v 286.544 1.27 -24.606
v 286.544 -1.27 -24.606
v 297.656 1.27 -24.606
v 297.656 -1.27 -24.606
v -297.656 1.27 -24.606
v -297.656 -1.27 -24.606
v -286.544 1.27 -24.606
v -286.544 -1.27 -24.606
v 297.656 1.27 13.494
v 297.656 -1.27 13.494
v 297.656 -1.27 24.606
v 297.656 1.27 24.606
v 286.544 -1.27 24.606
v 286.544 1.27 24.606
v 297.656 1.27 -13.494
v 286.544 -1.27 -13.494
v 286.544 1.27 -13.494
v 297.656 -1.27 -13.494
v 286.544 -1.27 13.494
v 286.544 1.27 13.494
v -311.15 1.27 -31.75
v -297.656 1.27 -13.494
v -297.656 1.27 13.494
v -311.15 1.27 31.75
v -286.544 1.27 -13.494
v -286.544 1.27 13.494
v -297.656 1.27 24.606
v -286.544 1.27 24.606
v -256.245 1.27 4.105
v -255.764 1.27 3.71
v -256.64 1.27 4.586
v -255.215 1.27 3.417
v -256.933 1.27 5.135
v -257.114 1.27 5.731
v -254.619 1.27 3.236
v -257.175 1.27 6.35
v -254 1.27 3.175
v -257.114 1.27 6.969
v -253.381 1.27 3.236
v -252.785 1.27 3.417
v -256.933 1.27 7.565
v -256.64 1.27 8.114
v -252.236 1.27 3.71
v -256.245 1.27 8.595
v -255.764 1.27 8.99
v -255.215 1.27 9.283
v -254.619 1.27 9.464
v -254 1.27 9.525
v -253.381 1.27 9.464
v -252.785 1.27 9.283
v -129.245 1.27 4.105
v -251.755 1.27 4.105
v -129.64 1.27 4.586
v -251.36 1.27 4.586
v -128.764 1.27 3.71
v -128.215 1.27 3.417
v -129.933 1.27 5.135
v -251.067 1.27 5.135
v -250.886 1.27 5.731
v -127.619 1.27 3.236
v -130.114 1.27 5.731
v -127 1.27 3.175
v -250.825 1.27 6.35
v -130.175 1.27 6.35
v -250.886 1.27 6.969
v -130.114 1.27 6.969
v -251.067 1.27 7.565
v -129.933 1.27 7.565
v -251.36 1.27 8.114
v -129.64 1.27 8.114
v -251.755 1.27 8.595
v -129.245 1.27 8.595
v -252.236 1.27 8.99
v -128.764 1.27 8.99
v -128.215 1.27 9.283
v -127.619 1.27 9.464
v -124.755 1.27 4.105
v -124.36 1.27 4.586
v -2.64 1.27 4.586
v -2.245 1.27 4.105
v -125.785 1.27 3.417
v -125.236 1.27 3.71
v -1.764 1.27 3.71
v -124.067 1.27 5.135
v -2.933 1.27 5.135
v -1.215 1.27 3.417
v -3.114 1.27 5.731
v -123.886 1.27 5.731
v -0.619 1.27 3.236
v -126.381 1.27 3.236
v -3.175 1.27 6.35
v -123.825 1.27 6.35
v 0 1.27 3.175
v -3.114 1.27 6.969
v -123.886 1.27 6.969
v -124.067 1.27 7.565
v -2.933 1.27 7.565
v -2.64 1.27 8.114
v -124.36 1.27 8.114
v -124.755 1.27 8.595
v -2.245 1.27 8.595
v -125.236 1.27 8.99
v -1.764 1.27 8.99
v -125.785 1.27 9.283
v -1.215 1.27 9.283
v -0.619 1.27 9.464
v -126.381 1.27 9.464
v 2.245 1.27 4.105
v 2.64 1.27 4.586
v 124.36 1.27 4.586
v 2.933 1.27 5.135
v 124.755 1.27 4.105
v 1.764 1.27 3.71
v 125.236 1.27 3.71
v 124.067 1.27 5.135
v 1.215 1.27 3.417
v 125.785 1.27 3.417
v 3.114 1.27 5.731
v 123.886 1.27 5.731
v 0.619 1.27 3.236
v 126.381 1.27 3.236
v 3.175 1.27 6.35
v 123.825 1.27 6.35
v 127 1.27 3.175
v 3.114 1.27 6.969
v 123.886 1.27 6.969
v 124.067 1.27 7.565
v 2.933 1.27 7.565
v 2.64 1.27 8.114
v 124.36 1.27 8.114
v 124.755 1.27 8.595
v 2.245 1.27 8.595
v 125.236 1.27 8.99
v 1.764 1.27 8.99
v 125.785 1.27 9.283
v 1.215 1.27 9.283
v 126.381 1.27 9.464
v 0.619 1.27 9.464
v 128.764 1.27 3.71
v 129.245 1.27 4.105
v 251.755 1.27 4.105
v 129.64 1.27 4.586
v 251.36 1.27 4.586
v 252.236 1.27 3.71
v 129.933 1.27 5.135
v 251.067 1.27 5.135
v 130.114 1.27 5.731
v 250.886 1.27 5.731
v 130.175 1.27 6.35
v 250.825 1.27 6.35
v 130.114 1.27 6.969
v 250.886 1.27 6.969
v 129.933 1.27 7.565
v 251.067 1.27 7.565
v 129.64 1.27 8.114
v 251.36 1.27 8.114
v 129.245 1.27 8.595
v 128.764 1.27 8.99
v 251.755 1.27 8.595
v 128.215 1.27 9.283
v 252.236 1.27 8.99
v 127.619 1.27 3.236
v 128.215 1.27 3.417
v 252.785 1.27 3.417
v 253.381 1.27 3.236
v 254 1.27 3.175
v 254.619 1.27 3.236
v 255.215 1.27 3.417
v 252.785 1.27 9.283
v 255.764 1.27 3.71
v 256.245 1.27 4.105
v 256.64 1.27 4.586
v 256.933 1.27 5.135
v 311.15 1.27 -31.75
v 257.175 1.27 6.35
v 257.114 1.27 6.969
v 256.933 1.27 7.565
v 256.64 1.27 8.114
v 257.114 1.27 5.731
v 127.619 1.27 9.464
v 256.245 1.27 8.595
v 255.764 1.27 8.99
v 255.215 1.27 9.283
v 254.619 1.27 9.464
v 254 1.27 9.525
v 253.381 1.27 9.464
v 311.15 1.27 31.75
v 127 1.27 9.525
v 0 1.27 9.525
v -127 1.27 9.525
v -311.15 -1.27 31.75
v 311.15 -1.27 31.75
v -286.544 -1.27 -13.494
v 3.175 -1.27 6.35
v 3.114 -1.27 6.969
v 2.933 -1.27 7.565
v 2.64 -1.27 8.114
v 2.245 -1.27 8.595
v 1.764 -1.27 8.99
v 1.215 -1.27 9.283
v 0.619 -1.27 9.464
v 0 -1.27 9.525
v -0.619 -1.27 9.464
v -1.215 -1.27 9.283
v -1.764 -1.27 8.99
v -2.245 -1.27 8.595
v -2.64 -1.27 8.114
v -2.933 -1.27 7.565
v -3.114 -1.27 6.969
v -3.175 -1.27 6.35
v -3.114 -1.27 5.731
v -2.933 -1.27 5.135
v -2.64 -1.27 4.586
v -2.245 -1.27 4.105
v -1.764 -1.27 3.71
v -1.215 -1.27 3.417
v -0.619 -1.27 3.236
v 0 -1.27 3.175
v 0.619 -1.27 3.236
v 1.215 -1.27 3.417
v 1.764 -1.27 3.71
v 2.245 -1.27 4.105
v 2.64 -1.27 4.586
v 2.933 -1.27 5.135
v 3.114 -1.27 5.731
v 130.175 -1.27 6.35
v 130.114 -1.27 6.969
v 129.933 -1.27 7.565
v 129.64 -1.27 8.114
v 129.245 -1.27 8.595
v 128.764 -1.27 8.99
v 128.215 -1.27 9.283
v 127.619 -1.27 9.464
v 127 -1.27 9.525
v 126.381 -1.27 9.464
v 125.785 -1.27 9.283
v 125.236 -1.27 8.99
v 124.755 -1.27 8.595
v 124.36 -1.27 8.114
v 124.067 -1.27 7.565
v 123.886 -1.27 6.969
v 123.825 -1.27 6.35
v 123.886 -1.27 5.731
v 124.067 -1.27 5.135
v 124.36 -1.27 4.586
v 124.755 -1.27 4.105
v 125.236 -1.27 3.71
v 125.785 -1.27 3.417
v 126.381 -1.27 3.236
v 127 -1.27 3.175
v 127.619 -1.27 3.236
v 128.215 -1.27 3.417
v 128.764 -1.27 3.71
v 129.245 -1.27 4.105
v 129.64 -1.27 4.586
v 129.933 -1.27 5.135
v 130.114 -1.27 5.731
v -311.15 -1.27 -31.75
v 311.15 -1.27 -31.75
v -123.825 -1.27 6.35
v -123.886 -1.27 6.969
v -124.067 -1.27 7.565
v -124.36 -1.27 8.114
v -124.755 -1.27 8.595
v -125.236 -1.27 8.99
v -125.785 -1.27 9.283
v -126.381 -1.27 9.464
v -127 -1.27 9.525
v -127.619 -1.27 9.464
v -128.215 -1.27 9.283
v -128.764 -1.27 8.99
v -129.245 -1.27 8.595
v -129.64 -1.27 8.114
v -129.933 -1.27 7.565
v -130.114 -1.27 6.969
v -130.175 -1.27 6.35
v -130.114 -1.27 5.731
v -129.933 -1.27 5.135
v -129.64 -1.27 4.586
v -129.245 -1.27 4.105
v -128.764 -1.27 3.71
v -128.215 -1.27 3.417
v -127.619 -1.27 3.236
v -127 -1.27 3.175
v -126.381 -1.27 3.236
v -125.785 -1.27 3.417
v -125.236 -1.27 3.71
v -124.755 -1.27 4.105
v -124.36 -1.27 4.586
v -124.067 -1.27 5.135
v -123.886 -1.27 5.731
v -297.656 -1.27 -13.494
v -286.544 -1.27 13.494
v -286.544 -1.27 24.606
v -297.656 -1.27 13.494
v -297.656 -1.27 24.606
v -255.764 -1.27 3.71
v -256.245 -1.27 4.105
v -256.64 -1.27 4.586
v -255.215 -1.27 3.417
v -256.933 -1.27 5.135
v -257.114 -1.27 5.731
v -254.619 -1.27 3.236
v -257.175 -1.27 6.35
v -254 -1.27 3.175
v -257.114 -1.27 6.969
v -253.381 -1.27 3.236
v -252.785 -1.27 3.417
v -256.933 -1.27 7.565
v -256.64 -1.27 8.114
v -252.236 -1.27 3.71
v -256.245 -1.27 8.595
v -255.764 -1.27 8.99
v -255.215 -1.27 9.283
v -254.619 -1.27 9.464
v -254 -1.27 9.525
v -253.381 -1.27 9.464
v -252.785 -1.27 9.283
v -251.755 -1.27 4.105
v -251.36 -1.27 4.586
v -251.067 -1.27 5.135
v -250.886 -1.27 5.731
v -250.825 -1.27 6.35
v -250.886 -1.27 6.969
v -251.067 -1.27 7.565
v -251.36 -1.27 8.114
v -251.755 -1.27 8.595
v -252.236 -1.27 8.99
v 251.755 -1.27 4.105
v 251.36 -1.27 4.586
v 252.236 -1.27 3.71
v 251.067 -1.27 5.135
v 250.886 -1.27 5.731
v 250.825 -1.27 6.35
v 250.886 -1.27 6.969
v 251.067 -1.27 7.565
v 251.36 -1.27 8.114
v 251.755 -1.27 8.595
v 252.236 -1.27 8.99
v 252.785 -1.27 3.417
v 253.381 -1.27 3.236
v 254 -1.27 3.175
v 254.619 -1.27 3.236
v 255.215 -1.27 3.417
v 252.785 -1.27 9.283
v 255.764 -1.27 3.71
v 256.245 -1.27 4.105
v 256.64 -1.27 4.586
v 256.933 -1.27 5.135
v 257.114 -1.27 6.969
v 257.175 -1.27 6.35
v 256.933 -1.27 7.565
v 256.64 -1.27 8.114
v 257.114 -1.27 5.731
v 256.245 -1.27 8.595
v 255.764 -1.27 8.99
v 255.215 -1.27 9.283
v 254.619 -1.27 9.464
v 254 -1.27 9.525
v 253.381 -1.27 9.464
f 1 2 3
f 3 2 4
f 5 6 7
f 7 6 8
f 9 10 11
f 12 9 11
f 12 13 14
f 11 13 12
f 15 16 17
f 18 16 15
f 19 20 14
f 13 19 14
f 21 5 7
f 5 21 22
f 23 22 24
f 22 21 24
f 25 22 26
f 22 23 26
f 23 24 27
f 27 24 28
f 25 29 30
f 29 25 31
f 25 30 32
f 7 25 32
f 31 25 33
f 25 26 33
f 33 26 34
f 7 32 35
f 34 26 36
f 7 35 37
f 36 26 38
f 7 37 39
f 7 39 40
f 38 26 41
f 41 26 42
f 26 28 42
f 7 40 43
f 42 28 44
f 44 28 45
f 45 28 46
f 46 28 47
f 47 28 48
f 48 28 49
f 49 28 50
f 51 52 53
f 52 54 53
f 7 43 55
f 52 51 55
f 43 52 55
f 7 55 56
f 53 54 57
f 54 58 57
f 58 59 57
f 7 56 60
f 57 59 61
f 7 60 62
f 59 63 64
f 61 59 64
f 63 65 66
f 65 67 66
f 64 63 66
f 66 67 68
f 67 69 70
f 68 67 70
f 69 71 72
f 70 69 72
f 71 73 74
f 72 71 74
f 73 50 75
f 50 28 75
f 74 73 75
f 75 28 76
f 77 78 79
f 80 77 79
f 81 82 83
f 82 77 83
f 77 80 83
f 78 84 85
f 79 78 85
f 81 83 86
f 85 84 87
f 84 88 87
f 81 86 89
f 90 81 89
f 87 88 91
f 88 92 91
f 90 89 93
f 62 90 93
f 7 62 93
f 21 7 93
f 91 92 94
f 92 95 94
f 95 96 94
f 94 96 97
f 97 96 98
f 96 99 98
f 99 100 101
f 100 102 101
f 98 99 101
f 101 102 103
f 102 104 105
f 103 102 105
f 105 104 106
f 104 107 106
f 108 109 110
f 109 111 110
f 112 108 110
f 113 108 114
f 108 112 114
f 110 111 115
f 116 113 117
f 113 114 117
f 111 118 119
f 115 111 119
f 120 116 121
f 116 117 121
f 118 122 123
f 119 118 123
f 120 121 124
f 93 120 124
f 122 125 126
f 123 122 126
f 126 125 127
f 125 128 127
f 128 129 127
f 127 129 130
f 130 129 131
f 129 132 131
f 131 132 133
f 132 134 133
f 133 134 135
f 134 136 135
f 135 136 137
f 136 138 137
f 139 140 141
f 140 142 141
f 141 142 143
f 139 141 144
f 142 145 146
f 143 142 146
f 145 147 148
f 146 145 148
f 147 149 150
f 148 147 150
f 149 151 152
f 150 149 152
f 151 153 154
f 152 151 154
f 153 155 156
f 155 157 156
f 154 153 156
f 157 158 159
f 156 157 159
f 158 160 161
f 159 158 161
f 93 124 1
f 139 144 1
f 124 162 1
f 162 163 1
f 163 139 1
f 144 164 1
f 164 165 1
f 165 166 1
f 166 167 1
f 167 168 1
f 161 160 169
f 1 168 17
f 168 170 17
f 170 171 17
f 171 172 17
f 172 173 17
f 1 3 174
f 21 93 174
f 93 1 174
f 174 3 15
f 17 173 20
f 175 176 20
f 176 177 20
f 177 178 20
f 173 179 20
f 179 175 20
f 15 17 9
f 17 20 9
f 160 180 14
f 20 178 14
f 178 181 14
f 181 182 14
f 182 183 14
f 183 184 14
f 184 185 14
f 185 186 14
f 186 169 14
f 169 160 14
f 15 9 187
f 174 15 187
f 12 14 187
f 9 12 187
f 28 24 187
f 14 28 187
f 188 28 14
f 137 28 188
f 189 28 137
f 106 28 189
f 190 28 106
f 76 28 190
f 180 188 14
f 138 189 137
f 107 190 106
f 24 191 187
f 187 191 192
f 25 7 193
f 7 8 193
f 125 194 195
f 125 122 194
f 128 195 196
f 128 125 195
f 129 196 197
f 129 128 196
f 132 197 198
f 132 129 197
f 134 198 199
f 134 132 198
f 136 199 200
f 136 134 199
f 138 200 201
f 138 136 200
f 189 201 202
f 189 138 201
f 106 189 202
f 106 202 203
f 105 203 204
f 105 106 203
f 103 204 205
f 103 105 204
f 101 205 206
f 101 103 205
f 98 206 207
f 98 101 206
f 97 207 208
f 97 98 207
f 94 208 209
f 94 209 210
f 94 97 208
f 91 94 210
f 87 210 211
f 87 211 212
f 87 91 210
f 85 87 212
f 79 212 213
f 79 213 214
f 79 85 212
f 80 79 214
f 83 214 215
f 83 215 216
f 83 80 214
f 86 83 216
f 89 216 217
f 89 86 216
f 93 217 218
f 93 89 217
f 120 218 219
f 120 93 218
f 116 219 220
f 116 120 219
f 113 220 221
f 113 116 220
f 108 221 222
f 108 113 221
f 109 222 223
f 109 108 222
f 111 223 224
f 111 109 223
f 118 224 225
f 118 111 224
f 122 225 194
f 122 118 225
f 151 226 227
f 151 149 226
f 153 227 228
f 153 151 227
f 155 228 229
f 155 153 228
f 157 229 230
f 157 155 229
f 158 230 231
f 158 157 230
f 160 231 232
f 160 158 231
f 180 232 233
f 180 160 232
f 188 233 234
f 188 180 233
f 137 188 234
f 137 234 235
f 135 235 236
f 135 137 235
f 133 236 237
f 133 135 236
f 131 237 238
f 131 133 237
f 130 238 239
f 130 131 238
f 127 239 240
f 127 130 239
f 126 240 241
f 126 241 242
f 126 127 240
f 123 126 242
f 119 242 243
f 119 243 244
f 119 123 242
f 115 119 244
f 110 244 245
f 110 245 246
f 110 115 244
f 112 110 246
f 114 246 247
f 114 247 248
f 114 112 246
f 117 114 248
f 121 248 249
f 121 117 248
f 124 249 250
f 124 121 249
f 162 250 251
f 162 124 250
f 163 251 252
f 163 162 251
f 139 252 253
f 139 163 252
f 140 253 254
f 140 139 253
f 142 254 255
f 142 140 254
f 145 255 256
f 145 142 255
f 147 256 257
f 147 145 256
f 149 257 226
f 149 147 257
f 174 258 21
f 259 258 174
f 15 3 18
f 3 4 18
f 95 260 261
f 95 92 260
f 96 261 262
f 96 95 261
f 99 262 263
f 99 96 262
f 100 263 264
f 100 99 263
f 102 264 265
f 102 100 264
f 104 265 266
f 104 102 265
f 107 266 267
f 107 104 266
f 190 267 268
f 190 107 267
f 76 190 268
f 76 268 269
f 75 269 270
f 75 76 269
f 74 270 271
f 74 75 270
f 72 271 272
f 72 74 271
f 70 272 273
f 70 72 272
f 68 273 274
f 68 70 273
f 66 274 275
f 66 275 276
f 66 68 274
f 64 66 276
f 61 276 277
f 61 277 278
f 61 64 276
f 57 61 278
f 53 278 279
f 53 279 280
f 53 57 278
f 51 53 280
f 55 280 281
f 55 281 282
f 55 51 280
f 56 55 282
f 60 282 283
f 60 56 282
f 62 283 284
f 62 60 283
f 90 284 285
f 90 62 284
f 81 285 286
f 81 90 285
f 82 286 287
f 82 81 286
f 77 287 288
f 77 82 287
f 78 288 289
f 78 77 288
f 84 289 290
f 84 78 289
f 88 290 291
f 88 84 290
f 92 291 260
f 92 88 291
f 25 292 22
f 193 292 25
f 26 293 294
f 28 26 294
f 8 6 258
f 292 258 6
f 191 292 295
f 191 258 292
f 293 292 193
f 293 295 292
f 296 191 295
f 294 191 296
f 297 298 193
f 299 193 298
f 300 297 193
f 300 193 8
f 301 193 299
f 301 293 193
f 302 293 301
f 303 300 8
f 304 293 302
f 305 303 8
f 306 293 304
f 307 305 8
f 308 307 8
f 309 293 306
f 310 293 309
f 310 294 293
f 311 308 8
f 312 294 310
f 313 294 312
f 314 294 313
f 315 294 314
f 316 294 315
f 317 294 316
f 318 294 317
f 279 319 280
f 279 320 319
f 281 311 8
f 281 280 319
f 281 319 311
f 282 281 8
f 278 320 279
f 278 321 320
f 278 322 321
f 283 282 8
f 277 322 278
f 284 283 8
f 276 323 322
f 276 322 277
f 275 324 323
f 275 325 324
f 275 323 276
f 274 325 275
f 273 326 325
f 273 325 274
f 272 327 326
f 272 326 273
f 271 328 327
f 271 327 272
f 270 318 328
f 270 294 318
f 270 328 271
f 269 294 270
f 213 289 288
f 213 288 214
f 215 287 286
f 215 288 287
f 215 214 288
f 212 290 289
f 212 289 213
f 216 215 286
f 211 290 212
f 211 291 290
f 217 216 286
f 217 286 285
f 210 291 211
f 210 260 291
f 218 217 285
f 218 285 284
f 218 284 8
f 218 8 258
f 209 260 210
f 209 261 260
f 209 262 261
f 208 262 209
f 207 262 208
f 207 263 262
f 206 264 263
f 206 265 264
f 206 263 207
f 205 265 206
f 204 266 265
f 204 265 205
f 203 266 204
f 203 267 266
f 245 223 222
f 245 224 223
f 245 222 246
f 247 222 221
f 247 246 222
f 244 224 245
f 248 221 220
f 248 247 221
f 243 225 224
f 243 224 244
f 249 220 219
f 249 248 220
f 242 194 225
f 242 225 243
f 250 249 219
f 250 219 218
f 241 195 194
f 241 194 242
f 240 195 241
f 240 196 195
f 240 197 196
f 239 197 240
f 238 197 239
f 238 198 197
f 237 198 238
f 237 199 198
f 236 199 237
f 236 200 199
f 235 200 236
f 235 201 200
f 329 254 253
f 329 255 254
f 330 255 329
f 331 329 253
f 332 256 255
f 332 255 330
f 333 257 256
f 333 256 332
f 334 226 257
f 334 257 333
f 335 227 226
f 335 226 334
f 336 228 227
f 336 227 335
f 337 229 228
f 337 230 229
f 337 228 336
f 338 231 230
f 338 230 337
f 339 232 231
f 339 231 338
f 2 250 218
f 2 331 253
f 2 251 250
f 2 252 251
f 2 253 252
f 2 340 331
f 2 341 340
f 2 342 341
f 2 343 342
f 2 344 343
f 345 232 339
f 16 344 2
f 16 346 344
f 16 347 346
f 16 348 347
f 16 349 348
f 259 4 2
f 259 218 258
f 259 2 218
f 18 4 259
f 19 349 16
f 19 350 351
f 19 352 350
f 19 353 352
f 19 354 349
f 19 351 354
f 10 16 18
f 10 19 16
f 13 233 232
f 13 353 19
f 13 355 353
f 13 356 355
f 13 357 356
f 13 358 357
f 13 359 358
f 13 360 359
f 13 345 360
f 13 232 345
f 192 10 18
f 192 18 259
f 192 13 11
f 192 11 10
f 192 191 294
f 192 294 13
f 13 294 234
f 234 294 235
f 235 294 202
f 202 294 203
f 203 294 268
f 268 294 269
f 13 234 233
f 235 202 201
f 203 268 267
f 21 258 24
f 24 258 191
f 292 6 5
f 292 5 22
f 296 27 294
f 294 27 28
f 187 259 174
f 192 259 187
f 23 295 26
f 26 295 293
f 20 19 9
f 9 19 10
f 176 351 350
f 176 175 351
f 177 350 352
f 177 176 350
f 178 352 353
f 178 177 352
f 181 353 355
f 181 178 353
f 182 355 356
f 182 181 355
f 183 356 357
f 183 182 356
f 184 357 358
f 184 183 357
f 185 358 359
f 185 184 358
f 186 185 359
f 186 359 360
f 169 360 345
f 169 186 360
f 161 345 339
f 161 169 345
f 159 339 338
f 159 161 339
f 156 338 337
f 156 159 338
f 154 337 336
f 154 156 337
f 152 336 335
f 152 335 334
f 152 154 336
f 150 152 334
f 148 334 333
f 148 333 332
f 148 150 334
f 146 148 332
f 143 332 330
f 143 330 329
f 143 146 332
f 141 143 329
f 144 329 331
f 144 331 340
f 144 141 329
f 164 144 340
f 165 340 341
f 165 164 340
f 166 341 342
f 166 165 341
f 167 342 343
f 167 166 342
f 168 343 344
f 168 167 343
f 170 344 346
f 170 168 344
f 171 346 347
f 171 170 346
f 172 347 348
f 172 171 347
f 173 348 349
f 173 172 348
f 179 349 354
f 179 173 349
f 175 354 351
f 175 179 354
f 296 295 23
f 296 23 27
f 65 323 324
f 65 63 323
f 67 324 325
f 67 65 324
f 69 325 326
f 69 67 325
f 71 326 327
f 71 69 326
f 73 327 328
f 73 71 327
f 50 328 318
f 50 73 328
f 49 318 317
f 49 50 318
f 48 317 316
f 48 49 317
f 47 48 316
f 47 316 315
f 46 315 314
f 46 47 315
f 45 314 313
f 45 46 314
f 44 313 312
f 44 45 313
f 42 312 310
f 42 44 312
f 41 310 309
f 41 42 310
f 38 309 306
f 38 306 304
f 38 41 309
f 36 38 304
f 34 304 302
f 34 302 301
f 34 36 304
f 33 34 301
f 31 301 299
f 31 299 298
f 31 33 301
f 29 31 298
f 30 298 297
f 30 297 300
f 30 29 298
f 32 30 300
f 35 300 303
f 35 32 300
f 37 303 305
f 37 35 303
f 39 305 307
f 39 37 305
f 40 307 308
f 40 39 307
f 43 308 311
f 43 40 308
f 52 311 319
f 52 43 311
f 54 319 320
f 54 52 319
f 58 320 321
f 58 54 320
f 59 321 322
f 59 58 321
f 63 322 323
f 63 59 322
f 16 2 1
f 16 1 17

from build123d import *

# Parameters (mm, degrees)
F0_W     = 622.3
F0_H     = 63.5
F0_W_2   = 11.1125
F0_H_2   = 11.1125
F0_R     = 3.175
F1_DEPTH = 1.27


with BuildPart() as f1:
    # F0 (on Front) → F1 (new body, symmetric)
    with BuildSketch(Plane.XZ):
        Rectangle(F0_W, F0_H)
        with Locations((-292.1, -19.05)):
            Rectangle(F0_W_2, F0_H_2, mode=Mode.SUBTRACT)
        with Locations((292.1, -19.05)):
            Rectangle(F0_W_2, F0_H_2, mode=Mode.SUBTRACT)
        with Locations((-254, 6.35)):
            Circle(F0_R, mode=Mode.SUBTRACT)
        with Locations((-127, 6.35)):
            Circle(F0_R, mode=Mode.SUBTRACT)
        with Locations((-292.1, 19.05)):
            Rectangle(F0_W_2, F0_H_2, mode=Mode.SUBTRACT)
        with Locations((0, 6.35)):
            Circle(F0_R, mode=Mode.SUBTRACT)
        with Locations((127, 6.35)):
            Circle(F0_R, mode=Mode.SUBTRACT)
        with Locations((254, 6.35)):
            Circle(F0_R, mode=Mode.SUBTRACT)
        with Locations((292.1, 19.05)):
            Rectangle(F0_W_2, F0_H_2, mode=Mode.SUBTRACT)
    extrude(amount=F1_DEPTH, both=True)


solid = f1.part
